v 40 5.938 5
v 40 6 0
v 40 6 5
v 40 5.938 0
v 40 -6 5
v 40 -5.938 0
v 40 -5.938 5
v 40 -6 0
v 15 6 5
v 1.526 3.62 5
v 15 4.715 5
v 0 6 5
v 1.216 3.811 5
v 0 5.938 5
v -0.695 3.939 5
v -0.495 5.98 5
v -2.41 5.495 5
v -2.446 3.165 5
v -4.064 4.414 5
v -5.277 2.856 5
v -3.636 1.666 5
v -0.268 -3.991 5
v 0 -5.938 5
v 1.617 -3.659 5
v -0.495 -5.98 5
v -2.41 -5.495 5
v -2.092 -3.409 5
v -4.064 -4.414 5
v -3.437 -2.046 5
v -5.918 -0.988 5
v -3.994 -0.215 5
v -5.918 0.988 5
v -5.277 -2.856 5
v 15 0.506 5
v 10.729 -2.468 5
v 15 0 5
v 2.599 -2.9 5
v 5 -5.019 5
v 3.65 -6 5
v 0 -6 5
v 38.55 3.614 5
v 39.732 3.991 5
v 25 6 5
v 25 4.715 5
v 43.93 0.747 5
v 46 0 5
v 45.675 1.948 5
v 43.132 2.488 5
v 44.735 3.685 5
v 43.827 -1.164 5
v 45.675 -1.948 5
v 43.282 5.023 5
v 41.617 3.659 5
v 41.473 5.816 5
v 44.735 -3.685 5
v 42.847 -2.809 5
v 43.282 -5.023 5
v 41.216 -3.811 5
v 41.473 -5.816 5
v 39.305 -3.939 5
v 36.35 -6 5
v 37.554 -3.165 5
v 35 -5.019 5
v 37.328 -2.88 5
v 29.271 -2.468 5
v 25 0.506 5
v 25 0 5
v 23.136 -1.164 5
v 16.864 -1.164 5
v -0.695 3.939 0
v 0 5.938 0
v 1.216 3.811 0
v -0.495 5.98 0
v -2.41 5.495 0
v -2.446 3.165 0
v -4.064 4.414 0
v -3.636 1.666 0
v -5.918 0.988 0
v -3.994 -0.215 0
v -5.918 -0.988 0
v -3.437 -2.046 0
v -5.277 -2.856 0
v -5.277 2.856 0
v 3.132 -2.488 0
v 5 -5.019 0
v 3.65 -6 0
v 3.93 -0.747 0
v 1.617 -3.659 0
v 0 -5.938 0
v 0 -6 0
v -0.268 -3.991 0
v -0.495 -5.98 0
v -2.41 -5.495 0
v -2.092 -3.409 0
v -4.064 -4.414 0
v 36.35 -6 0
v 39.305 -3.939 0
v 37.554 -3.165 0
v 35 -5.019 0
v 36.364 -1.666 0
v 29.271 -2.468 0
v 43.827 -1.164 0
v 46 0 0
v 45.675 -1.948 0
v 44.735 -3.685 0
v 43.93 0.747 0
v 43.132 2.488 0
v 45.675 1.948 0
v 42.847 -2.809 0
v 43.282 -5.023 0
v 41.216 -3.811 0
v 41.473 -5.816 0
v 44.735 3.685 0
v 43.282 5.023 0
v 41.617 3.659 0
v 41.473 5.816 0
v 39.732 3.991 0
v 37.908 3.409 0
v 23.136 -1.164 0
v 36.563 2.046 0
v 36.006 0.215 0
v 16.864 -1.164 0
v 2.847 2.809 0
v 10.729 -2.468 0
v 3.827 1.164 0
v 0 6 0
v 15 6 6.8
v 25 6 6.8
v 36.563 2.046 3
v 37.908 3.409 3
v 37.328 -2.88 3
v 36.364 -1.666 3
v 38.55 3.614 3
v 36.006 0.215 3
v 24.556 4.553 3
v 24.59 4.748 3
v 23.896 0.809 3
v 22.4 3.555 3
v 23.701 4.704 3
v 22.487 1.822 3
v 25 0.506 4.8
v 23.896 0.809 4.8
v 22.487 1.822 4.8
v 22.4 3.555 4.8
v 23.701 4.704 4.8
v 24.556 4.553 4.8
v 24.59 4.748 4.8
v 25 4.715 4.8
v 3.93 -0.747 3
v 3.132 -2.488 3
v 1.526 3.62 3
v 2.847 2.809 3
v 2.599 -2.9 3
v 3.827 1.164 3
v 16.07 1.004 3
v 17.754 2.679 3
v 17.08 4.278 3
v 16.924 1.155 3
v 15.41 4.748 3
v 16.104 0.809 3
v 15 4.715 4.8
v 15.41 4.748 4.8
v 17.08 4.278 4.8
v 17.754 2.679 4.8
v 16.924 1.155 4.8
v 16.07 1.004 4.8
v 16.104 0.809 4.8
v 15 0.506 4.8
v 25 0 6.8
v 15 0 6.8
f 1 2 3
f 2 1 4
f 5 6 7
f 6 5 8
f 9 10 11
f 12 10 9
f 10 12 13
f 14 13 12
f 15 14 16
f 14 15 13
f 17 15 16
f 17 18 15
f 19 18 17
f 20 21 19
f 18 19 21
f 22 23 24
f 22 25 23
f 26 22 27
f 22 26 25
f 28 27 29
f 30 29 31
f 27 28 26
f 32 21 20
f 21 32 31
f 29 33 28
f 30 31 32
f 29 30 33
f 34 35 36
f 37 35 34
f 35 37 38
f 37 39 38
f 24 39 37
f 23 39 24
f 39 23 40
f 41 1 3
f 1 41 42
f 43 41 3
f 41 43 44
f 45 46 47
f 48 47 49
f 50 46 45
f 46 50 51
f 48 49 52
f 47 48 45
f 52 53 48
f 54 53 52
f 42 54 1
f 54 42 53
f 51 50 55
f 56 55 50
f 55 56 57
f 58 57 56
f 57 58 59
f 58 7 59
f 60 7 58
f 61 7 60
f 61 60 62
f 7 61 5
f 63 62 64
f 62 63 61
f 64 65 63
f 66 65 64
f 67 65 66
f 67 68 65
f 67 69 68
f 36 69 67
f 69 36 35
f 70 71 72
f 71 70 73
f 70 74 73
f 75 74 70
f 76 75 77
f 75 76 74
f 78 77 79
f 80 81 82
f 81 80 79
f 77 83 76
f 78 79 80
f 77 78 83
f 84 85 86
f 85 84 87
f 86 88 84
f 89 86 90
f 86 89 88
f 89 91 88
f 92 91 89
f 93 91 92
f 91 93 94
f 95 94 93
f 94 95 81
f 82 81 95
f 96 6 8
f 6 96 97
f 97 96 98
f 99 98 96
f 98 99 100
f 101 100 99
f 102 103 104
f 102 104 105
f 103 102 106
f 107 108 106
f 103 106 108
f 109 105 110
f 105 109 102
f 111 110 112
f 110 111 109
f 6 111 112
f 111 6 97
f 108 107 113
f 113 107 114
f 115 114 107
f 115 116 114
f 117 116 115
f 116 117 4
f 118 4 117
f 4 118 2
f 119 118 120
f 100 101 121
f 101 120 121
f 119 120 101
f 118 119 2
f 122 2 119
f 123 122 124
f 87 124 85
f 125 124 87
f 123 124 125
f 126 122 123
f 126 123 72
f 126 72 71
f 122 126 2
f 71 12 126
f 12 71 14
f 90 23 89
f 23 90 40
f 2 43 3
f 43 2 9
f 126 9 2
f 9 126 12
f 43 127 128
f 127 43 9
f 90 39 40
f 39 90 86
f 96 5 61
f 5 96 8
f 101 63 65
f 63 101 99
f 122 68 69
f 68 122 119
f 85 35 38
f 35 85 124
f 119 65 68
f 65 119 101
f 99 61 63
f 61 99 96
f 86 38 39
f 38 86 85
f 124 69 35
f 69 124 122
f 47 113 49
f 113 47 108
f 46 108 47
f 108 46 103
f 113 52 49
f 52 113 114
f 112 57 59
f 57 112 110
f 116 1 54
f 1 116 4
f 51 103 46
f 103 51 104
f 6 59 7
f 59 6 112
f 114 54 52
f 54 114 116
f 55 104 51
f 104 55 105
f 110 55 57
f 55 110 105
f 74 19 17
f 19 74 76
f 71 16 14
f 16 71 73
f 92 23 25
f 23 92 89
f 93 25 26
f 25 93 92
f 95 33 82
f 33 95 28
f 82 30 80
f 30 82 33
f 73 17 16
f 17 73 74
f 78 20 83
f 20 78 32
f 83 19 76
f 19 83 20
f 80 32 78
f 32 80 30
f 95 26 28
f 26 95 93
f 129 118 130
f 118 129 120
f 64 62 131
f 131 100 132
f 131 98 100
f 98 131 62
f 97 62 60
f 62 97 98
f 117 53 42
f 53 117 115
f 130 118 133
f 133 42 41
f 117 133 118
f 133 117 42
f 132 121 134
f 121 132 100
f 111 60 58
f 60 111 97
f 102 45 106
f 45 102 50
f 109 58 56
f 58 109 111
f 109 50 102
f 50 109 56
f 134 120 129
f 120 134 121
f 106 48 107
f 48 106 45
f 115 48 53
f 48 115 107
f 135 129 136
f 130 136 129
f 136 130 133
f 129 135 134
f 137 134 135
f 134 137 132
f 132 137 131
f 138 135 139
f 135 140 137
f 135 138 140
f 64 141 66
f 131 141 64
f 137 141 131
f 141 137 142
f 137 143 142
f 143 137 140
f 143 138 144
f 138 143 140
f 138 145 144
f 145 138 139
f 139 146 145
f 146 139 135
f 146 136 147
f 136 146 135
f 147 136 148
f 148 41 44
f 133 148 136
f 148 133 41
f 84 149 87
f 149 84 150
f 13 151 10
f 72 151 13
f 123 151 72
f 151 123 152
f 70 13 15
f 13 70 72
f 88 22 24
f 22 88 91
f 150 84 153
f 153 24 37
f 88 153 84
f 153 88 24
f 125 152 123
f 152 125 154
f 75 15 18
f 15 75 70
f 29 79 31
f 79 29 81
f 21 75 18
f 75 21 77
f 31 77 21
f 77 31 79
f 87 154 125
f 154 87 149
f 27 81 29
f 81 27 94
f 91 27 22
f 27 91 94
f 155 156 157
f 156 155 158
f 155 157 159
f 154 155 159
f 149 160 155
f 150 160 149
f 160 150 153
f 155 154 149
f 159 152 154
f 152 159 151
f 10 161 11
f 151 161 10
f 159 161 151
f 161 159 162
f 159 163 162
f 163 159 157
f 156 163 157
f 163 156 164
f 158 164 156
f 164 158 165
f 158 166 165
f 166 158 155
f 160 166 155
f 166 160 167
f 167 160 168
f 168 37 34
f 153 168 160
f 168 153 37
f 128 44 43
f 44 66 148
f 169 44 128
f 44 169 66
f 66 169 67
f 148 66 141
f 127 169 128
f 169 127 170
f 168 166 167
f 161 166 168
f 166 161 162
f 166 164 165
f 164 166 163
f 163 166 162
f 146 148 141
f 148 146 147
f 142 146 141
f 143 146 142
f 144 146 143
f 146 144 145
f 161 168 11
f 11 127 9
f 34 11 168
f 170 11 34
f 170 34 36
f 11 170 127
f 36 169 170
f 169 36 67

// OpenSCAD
// file: servo_arm.scad
module servo_arm(body_r = 8/2, arm_r1 = 7/2, arm_r2 = 4/2, arm_len = 16, arm_t = 2.5, body_t = 7) {
	cylinder(r = body_r, h = body_t);
	
	linear_extrude(height = arm_t) {
		circle(r = arm_r1);
		translate([0,arm_len,0]) circle(r = arm_r2);
		polygon(points = [ [-arm_r1, 0], [arm_r1, 0], [arm_r2, arm_len], [-arm_r2, arm_len] ]);
	}
}
// main file
// alternate femur

include <servo_arm.scad>;

module body(thickness, center_to_center, width) {
	difference() {
		translate([0,0,thickness/2]) union() {
			difference() {
				cube([center_to_center, width, thickness], center = true);
				translate([0,-31, -.1]) cylinder(r=30, h=thickness+.3, center = true);
			}
			for(x = [+center_to_center/2, -center_to_center/2]) 
				translate([x, 0, 0]) cylinder(r = width/2, h = thickness, center = true);
		}
	}

}

module lock()
{
translate([20,3,5.8])
cube([10,6,2],center = true);
}


module femur(thickness = 5, center_to_center = 40, width = 12) {
	translate([center_to_center/2, 0, 0])
	difference() {
		body(thickness, center_to_center, width);
		color("red") translate([center_to_center/2,0,thickness + 0.5]) rotate([0, 180, 80]) servo_arm();
		color("red") translate([-center_to_center/2,0,thickness + 0.5]) rotate([0, 180, -80]) servo_arm();
	}
}

femur();
lock();
